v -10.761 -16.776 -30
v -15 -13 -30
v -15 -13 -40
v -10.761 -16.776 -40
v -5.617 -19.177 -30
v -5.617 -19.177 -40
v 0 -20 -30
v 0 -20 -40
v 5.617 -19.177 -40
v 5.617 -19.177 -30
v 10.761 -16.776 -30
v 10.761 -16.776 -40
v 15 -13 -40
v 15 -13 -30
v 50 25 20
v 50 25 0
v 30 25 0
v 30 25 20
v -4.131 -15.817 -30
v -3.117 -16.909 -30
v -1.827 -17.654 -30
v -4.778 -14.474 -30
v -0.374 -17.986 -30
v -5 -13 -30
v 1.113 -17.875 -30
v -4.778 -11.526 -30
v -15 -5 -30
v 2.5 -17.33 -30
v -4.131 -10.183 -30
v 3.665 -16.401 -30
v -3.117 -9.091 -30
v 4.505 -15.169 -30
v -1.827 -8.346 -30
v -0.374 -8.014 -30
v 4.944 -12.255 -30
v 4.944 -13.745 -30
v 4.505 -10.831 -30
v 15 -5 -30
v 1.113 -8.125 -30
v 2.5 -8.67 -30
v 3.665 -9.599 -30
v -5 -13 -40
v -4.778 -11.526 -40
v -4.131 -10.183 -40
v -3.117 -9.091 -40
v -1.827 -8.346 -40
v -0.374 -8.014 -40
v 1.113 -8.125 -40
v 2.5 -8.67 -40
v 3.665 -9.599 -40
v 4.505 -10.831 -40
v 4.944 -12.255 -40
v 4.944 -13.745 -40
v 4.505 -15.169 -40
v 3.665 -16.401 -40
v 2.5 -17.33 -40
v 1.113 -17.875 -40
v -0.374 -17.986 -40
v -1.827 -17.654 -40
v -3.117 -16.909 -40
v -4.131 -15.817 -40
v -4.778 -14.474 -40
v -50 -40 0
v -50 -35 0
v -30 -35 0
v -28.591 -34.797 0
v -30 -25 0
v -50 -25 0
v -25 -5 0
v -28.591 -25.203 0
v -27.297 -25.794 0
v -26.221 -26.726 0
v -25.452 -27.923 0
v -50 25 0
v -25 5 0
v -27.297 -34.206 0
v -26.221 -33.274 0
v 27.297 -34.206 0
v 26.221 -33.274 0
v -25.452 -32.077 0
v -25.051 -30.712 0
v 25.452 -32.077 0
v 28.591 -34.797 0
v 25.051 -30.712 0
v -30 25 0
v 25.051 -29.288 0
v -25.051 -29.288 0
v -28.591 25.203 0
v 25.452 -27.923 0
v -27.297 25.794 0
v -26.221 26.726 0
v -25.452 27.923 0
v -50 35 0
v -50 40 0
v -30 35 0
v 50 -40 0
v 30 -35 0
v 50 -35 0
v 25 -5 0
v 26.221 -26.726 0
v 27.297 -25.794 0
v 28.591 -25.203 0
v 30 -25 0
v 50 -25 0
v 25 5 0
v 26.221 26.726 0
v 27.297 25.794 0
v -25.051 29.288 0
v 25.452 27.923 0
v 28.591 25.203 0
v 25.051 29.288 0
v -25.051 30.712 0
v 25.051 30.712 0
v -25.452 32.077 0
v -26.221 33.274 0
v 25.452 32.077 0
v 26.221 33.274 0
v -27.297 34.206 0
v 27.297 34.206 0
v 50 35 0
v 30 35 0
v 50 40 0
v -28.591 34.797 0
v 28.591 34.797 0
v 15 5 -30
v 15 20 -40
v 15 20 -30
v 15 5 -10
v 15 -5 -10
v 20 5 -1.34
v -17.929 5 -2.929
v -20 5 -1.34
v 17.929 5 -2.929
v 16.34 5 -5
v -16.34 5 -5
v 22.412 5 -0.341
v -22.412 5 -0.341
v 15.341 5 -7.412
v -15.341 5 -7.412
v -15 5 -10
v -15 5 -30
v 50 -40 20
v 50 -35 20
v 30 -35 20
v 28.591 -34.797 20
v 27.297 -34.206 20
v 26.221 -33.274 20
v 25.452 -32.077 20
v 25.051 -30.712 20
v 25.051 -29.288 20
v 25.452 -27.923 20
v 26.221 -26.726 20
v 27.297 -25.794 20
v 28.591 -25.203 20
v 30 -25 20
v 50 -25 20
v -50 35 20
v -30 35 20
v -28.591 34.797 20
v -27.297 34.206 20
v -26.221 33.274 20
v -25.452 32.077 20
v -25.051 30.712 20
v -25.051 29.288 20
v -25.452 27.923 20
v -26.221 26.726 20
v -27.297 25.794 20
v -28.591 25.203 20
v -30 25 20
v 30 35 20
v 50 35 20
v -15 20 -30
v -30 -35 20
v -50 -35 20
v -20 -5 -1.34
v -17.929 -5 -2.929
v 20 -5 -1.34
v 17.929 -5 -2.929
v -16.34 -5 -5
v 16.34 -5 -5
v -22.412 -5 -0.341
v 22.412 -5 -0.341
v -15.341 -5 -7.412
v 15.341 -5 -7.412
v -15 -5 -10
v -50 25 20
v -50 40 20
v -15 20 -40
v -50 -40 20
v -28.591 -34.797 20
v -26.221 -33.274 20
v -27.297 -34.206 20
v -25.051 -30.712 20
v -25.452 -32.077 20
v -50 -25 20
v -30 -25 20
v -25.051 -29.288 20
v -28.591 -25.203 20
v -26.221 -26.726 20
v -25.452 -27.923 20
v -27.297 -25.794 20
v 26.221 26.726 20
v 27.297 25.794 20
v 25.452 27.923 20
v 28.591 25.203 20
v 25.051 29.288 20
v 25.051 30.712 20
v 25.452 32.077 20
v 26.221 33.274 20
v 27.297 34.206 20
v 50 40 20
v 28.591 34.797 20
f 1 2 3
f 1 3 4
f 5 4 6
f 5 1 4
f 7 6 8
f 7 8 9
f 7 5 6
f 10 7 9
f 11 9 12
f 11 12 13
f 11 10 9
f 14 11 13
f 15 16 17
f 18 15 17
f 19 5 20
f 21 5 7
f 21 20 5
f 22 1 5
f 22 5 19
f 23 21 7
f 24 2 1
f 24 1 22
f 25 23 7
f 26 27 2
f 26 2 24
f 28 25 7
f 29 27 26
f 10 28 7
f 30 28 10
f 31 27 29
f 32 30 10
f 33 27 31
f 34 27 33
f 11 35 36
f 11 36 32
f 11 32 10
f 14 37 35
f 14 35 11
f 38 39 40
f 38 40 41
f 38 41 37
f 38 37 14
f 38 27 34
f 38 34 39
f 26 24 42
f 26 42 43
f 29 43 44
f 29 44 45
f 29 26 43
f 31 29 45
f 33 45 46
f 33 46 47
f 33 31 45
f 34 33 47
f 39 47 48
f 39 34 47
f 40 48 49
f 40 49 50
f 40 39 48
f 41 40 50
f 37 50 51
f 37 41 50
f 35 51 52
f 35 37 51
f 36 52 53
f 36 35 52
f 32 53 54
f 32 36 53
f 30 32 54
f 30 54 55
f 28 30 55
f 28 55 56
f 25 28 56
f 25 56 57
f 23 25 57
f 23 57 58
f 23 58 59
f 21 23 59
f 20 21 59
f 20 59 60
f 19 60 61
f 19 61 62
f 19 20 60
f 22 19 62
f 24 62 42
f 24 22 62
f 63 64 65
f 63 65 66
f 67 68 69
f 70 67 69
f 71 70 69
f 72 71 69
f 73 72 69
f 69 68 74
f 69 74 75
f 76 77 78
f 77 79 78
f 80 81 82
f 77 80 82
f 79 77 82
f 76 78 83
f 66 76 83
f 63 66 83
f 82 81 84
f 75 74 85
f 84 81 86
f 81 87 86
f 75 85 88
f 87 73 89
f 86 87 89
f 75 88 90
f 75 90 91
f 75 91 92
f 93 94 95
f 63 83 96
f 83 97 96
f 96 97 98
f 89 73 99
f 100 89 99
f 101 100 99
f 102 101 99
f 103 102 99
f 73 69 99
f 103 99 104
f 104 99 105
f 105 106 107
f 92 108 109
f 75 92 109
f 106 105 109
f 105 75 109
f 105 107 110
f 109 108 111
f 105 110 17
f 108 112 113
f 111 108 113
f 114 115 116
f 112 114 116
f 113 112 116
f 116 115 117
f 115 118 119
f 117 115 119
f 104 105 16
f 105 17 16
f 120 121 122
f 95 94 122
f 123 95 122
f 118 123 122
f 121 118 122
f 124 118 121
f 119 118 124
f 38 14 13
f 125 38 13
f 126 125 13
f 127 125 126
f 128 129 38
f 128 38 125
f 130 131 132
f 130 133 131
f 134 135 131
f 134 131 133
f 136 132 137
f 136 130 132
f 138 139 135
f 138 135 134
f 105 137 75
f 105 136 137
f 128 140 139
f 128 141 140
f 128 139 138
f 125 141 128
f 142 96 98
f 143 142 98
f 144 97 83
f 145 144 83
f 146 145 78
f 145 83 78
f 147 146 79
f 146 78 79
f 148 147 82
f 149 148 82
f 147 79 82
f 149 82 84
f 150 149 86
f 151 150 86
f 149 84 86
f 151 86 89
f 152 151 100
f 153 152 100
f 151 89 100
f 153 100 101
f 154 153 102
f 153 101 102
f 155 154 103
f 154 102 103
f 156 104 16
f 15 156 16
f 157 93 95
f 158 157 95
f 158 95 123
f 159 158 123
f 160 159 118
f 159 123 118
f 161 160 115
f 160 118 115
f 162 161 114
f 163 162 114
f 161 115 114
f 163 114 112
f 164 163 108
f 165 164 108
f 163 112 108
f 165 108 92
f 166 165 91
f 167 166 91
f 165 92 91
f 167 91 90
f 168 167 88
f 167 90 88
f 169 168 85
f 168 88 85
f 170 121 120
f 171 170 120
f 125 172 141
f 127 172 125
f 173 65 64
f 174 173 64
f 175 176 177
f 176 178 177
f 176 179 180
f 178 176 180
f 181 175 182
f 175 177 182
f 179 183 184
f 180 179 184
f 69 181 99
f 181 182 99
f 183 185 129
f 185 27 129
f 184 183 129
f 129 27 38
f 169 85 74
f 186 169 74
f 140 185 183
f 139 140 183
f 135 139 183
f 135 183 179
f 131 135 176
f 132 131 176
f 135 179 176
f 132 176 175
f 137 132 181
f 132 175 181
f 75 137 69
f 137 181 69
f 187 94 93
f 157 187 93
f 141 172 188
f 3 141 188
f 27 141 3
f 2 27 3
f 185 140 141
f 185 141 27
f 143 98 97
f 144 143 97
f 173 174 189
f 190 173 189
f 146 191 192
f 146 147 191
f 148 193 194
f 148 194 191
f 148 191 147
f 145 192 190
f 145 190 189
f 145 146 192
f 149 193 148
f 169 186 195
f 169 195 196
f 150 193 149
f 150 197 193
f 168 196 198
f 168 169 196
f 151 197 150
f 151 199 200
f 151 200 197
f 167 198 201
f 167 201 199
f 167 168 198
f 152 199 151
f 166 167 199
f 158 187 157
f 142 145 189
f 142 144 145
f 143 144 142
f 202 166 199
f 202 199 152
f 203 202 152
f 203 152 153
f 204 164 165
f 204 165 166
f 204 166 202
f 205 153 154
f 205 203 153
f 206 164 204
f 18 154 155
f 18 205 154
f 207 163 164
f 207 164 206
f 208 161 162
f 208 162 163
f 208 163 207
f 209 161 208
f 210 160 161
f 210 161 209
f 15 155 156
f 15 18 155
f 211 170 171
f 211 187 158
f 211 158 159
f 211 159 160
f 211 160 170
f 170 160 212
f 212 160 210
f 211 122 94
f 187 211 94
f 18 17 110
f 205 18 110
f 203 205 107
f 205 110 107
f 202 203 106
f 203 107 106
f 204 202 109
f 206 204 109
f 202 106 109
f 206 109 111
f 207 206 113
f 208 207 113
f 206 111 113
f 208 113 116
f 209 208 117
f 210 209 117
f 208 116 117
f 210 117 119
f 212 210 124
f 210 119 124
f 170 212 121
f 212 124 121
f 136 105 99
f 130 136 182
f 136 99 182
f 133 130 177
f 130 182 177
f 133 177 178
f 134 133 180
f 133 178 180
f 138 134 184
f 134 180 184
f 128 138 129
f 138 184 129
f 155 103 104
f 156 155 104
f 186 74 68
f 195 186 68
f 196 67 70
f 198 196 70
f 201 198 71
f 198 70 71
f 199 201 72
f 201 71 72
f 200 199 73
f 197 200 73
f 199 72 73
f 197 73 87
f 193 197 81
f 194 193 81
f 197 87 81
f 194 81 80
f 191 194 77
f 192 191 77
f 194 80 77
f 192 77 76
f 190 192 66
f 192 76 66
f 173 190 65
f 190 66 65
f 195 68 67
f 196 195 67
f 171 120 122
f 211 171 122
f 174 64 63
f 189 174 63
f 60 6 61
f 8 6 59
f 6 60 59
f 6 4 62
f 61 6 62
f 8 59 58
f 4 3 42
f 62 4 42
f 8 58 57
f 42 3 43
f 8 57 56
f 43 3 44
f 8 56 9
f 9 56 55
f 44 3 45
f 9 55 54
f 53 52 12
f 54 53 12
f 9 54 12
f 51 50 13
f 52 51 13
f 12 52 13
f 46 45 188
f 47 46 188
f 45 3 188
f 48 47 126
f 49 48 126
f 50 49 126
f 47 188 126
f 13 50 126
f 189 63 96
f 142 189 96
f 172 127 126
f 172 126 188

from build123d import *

# Parameters (mm, degrees)
EXTRUDE_1_DEPTH = 20
EXTRUDE_2_DEPTH = 10
SKETCH_3_R      = 5
EXTRUDE_3_DEPTH = 10


with BuildPart() as part:
    # 草圖1 → 填料-伸長1 (new body)
    with BuildSketch(Plane.XY):
        with BuildLine():
            Line((50, 40), (-50, 40))
            Line((-50, 40), (-50, 35))
            Line((-50, 35), (-30, 35))
            ThreePointArc((-30, 35), (-25, 30), (-30, 25))
            Line((-30, 25), (-50, 25))
            Line((-50, 25), (-50, -25))
            Line((-50, -25), (-30, -25))
            ThreePointArc((-30, -25), (-25, -30), (-30, -35))
            Line((-30, -35), (-50, -35))
            Line((-50, -35), (-50, -40))
            Line((-50, -40), (50, -40))
            Line((50, -40), (50, -35))
            Line((50, -35), (30, -35))
            ThreePointArc((30, -35), (25, -30), (30, -25))
            Line((30, -25), (50, -25))
            Line((50, -25), (50, 25))
            Line((50, 25), (30, 25))
            ThreePointArc((30, 25), (25, 30), (30, 35))
            Line((30, 35), (50, 35))
            Line((50, 35), (50, 40))
        make_face()
    extrude(amount=EXTRUDE_1_DEPTH)

    # 草圖2 → 填料-伸長2 (add)
    with BuildSketch(Plane(origin=(0, -5, 0), x_dir=(-1, 0, 0), z_dir=(0, -1, 0))):
        with BuildLine():
            ThreePointArc((15, 10), (17.928932188, 2.928932188), (25, 0))
            Line((25, 0), (-25, 0))
            ThreePointArc((-25, 0), (-17.928932188, 2.928932188), (-15, 10))
            Line((-15, 10), (-15, 30))
            Line((-15, 30), (15, 30))
            Line((15, 30), (15, 10))
        make_face()
    extrude(amount=-EXTRUDE_2_DEPTH)

    # 草圖3 → 填料-伸長3 (add)
    with BuildSketch(Plane(origin=(0, 0, -30), x_dir=(-1, 0, 0), z_dir=(0, 0, -1))):
        with BuildLine():
            Line((-15, 20), (15, 20))
            Line((15, 20), (15, -13))
            ThreePointArc((15, -13), (0, -20), (-15, -13))
            Line((-15, -13), (-15, 20))
        make_face()
        with Locations((0, -13)):
            Circle(SKETCH_3_R, mode=Mode.SUBTRACT)
    extrude(amount=EXTRUDE_3_DEPTH)


solid = part.part
